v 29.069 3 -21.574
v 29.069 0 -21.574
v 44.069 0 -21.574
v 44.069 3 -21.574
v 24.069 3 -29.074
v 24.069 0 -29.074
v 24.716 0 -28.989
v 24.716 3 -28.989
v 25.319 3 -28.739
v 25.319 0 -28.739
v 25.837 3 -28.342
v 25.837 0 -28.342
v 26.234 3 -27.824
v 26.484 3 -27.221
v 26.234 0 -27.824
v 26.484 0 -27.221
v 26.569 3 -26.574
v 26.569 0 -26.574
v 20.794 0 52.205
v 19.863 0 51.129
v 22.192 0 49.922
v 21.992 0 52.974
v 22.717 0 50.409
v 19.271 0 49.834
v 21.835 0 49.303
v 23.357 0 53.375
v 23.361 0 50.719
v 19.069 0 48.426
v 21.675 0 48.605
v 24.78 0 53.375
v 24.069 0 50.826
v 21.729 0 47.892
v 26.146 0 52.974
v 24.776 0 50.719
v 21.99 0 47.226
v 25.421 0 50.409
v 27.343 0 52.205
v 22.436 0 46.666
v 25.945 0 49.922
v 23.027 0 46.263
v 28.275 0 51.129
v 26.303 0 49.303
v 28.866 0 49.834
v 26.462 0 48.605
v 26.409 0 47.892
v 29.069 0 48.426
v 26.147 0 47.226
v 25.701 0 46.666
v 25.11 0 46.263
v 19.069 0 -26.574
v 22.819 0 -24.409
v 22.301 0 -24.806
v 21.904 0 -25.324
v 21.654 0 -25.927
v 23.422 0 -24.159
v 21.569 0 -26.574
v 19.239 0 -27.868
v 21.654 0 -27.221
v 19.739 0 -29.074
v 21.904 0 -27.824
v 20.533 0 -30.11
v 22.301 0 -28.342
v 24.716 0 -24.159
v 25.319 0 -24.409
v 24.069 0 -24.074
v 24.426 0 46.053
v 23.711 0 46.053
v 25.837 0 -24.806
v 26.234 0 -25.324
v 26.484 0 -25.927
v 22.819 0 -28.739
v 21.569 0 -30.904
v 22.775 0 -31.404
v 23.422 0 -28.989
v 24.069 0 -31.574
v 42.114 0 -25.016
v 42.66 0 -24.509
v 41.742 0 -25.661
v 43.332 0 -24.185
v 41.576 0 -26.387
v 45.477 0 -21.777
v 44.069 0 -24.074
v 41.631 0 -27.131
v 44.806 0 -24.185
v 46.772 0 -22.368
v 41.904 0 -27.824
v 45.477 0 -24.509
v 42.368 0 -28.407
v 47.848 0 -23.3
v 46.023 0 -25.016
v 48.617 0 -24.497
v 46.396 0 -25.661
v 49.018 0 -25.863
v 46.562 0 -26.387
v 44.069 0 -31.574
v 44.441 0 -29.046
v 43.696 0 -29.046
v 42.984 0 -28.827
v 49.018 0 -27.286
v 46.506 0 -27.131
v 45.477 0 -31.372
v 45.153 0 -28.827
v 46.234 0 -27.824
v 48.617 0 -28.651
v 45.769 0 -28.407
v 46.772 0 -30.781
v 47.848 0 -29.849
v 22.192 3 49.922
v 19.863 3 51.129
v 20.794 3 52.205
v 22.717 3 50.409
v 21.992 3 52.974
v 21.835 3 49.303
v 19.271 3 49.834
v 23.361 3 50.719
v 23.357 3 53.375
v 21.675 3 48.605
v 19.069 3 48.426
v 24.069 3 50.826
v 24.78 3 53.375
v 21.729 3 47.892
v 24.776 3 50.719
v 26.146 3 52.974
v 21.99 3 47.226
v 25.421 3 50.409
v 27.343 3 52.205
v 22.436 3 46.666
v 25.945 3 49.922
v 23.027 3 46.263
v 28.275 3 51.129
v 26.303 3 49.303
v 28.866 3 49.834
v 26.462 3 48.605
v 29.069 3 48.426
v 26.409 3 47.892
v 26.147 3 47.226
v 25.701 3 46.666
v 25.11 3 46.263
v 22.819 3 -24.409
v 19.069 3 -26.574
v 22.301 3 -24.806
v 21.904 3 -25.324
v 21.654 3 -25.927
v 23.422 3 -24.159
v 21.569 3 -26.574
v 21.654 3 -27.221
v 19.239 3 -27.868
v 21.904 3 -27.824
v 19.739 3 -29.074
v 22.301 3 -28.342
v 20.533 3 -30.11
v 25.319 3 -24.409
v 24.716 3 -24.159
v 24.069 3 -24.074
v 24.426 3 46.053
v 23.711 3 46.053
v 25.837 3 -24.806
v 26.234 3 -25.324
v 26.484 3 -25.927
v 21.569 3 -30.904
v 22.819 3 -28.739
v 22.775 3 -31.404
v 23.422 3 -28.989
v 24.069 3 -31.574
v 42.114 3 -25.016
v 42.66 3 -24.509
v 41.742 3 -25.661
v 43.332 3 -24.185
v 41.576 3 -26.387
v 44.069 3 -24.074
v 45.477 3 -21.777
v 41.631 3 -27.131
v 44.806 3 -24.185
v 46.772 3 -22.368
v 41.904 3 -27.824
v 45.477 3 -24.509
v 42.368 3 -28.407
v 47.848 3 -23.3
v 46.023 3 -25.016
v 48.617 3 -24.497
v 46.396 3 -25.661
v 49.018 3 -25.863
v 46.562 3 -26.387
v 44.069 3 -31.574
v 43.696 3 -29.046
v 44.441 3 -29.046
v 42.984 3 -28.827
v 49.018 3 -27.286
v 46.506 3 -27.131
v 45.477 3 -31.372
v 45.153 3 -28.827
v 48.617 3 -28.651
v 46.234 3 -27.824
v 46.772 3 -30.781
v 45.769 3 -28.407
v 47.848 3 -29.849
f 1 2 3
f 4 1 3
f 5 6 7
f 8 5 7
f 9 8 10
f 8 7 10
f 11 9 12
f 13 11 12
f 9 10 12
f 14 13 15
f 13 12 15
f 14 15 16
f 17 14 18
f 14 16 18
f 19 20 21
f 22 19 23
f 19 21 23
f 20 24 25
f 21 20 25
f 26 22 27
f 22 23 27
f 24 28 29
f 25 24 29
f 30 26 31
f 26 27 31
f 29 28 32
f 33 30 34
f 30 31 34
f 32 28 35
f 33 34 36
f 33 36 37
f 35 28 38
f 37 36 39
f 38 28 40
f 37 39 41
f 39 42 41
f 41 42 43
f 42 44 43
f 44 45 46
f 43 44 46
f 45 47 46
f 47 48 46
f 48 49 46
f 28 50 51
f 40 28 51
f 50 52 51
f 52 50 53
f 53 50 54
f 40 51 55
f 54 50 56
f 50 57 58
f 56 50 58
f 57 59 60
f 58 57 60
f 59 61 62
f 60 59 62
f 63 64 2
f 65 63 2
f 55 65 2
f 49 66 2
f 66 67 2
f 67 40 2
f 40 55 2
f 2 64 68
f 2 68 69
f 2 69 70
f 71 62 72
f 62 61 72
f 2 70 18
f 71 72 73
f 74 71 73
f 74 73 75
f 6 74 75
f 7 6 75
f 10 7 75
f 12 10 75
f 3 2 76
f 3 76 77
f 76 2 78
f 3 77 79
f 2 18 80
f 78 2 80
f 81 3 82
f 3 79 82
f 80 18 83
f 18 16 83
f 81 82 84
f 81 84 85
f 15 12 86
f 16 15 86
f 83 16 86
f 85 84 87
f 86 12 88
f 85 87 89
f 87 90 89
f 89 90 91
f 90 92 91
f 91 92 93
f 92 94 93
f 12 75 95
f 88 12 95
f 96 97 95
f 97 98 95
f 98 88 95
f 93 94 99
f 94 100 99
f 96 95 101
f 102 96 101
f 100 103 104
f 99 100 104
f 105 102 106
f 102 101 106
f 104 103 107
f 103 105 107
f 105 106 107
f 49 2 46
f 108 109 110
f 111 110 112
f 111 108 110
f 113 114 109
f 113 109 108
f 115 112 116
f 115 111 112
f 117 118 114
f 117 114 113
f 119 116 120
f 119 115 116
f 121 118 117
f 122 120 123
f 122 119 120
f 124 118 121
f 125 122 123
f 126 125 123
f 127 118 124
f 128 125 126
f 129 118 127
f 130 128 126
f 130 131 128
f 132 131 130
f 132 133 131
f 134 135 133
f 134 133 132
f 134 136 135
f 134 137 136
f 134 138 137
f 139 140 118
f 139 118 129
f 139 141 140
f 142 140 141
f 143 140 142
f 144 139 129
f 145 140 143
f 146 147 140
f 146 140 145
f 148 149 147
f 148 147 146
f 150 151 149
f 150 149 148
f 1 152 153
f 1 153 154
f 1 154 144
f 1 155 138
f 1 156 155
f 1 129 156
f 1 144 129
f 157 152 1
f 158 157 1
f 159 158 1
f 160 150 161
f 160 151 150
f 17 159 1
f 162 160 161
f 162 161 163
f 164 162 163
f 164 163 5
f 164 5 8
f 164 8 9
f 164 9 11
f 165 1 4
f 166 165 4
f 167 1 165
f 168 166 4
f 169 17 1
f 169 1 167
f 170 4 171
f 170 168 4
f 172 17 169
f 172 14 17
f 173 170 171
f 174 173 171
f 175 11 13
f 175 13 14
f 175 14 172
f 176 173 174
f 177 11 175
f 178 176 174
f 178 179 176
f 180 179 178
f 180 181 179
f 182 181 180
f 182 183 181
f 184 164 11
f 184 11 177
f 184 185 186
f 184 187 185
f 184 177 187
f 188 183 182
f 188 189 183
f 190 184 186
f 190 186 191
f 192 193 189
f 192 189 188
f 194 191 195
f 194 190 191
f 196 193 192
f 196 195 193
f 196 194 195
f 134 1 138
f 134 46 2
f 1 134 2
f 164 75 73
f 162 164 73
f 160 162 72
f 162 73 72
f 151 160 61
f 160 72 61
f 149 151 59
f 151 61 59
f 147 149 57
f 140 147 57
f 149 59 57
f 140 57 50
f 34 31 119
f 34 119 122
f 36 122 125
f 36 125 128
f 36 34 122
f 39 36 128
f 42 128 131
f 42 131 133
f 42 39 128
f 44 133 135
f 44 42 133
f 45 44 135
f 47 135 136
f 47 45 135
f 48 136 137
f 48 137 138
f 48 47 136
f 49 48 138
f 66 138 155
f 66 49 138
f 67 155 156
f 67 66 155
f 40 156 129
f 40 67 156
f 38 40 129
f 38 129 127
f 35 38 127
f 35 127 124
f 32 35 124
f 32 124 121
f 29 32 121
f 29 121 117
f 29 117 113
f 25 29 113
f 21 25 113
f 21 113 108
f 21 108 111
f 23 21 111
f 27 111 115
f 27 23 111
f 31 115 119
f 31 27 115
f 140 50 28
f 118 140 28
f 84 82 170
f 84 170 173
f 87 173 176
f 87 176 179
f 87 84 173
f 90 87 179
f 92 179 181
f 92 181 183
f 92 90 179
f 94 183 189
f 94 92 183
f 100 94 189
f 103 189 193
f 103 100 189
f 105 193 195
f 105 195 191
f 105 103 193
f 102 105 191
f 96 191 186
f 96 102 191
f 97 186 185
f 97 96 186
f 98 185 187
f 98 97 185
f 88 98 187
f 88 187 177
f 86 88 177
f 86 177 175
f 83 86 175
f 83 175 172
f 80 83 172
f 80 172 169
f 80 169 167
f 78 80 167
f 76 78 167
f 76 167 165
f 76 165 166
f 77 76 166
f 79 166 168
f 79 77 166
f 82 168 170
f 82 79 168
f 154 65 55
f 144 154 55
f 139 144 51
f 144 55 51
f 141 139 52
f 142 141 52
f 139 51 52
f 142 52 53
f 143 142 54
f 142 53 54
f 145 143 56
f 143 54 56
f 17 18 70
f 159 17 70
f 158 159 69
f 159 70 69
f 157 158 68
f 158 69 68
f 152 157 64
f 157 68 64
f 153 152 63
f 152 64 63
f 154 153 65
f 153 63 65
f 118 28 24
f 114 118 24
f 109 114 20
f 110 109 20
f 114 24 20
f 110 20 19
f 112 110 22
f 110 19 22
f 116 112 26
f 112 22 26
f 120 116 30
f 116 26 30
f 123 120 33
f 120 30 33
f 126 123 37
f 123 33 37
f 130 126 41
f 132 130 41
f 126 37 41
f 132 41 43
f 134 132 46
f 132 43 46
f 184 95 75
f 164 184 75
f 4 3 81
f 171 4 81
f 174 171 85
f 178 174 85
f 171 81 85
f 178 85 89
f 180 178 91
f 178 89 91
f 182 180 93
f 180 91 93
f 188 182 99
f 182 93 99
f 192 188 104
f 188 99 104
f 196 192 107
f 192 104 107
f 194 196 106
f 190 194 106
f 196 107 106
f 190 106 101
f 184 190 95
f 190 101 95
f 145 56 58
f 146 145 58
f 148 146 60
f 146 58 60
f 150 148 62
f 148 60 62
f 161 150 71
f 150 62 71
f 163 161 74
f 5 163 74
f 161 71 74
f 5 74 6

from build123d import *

# Parameters (mm, degrees)
SKETCH1_R           = 2.4
SKETCH1_R_2         = 2.5
BOSS_EXTRUDE1_DEPTH = 3


with BuildPart() as part:
    # Sketch1 → Boss-Extrude1 (new body)
    # profile 1 of 4: a face of its own
    with BuildSketch(Plane(origin=(0, 0, 0), x_dir=(1, 0, 0), z_dir=(0, 1, 0))):
        with BuildLine():
            Line((19.068769591, 26.574235382), (19.068769591, -48.425764618))
            ThreePointArc((19.068769591, -48.425764618), (24.068769591, -53.425764618), (29.068769591, -48.425764618))
            Line((29.068769591, -48.425764618), (29.068769591, 21.574235382))
            Line((29.068769591, 21.574235382), (24.068769591, 21.574235382))
            Line((24.068769591, 21.574235382), (24.068769591, 24.074235382))
            ThreePointArc((24.068769591, 24.074235382), (22.301002638, 24.806468429), (21.568769591, 26.574235382))
            Line((21.568769591, 26.574235382), (19.068769591, 26.574235382))
        make_face()
        with Locations(Location((24.068769591, -48.425764618, 0), (0, 0, 270))):
            Circle(SKETCH1_R, mode=Mode.SUBTRACT)
    # profile 2 of 4: a face of its own
    with BuildSketch(Plane(origin=(0, 0, 0), x_dir=(1, 0, 0), z_dir=(0, 1, 0))):
        with BuildLine():
            Line((44.068769591, 31.574235382), (24.068769591, 31.574235382))
            Line((24.068769591, 31.574235382), (24.068769591, 29.074235382))
            ThreePointArc((24.068769591, 29.074235382), (25.836536544, 28.342002335), (26.568769591, 26.574235382))
            Line((26.568769591, 26.574235382), (29.068769591, 26.574235382))
            Line((29.068769591, 26.574235382), (29.068769591, 21.574235382))
            Line((29.068769591, 21.574235382), (44.068769591, 21.574235382))
            ThreePointArc((44.068769591, 21.574235382), (49.068769591, 26.574235382), (44.068769591, 31.574235382))
        make_face()
        with Locations(Location((44.068769591, 26.574235382, 0), (0, 0, 270))):
            Circle(SKETCH1_R_2, mode=Mode.SUBTRACT)
    # profile 3 of 4: a face of its own
    with BuildSketch(Plane(origin=(0, 0, 0), x_dir=(1, 0, 0), z_dir=(0, 1, 0))):
        with BuildLine():
            Line((24.068769591, 21.574235382), (29.068769591, 21.574235382))
            Line((29.068769591, 21.574235382), (29.068769591, 26.574235382))
            Line((29.068769591, 26.574235382), (26.568769591, 26.574235382))
            ThreePointArc((26.568769591, 26.574235382), (25.836536544, 24.806468429), (24.068769591, 24.074235382))
            Line((24.068769591, 24.074235382), (24.068769591, 21.574235382))
        make_face()
    # profile 4 of 4: a face of its own
    with BuildSketch(Plane(origin=(0, 0, 0), x_dir=(1, 0, 0), z_dir=(0, 1, 0))):
        with BuildLine():
            ThreePointArc((24.068769591, 31.574235382), (20.533235685, 30.109769288), (19.068769591, 26.574235382))
            Line((19.068769591, 26.574235382), (21.568769591, 26.574235382))
            ThreePointArc((21.568769591, 26.574235382), (22.301002638, 28.342002335), (24.068769591, 29.074235382))
            Line((24.068769591, 29.074235382), (24.068769591, 31.574235382))
        make_face()
    extrude(amount=BOSS_EXTRUDE1_DEPTH)


solid = part.part
